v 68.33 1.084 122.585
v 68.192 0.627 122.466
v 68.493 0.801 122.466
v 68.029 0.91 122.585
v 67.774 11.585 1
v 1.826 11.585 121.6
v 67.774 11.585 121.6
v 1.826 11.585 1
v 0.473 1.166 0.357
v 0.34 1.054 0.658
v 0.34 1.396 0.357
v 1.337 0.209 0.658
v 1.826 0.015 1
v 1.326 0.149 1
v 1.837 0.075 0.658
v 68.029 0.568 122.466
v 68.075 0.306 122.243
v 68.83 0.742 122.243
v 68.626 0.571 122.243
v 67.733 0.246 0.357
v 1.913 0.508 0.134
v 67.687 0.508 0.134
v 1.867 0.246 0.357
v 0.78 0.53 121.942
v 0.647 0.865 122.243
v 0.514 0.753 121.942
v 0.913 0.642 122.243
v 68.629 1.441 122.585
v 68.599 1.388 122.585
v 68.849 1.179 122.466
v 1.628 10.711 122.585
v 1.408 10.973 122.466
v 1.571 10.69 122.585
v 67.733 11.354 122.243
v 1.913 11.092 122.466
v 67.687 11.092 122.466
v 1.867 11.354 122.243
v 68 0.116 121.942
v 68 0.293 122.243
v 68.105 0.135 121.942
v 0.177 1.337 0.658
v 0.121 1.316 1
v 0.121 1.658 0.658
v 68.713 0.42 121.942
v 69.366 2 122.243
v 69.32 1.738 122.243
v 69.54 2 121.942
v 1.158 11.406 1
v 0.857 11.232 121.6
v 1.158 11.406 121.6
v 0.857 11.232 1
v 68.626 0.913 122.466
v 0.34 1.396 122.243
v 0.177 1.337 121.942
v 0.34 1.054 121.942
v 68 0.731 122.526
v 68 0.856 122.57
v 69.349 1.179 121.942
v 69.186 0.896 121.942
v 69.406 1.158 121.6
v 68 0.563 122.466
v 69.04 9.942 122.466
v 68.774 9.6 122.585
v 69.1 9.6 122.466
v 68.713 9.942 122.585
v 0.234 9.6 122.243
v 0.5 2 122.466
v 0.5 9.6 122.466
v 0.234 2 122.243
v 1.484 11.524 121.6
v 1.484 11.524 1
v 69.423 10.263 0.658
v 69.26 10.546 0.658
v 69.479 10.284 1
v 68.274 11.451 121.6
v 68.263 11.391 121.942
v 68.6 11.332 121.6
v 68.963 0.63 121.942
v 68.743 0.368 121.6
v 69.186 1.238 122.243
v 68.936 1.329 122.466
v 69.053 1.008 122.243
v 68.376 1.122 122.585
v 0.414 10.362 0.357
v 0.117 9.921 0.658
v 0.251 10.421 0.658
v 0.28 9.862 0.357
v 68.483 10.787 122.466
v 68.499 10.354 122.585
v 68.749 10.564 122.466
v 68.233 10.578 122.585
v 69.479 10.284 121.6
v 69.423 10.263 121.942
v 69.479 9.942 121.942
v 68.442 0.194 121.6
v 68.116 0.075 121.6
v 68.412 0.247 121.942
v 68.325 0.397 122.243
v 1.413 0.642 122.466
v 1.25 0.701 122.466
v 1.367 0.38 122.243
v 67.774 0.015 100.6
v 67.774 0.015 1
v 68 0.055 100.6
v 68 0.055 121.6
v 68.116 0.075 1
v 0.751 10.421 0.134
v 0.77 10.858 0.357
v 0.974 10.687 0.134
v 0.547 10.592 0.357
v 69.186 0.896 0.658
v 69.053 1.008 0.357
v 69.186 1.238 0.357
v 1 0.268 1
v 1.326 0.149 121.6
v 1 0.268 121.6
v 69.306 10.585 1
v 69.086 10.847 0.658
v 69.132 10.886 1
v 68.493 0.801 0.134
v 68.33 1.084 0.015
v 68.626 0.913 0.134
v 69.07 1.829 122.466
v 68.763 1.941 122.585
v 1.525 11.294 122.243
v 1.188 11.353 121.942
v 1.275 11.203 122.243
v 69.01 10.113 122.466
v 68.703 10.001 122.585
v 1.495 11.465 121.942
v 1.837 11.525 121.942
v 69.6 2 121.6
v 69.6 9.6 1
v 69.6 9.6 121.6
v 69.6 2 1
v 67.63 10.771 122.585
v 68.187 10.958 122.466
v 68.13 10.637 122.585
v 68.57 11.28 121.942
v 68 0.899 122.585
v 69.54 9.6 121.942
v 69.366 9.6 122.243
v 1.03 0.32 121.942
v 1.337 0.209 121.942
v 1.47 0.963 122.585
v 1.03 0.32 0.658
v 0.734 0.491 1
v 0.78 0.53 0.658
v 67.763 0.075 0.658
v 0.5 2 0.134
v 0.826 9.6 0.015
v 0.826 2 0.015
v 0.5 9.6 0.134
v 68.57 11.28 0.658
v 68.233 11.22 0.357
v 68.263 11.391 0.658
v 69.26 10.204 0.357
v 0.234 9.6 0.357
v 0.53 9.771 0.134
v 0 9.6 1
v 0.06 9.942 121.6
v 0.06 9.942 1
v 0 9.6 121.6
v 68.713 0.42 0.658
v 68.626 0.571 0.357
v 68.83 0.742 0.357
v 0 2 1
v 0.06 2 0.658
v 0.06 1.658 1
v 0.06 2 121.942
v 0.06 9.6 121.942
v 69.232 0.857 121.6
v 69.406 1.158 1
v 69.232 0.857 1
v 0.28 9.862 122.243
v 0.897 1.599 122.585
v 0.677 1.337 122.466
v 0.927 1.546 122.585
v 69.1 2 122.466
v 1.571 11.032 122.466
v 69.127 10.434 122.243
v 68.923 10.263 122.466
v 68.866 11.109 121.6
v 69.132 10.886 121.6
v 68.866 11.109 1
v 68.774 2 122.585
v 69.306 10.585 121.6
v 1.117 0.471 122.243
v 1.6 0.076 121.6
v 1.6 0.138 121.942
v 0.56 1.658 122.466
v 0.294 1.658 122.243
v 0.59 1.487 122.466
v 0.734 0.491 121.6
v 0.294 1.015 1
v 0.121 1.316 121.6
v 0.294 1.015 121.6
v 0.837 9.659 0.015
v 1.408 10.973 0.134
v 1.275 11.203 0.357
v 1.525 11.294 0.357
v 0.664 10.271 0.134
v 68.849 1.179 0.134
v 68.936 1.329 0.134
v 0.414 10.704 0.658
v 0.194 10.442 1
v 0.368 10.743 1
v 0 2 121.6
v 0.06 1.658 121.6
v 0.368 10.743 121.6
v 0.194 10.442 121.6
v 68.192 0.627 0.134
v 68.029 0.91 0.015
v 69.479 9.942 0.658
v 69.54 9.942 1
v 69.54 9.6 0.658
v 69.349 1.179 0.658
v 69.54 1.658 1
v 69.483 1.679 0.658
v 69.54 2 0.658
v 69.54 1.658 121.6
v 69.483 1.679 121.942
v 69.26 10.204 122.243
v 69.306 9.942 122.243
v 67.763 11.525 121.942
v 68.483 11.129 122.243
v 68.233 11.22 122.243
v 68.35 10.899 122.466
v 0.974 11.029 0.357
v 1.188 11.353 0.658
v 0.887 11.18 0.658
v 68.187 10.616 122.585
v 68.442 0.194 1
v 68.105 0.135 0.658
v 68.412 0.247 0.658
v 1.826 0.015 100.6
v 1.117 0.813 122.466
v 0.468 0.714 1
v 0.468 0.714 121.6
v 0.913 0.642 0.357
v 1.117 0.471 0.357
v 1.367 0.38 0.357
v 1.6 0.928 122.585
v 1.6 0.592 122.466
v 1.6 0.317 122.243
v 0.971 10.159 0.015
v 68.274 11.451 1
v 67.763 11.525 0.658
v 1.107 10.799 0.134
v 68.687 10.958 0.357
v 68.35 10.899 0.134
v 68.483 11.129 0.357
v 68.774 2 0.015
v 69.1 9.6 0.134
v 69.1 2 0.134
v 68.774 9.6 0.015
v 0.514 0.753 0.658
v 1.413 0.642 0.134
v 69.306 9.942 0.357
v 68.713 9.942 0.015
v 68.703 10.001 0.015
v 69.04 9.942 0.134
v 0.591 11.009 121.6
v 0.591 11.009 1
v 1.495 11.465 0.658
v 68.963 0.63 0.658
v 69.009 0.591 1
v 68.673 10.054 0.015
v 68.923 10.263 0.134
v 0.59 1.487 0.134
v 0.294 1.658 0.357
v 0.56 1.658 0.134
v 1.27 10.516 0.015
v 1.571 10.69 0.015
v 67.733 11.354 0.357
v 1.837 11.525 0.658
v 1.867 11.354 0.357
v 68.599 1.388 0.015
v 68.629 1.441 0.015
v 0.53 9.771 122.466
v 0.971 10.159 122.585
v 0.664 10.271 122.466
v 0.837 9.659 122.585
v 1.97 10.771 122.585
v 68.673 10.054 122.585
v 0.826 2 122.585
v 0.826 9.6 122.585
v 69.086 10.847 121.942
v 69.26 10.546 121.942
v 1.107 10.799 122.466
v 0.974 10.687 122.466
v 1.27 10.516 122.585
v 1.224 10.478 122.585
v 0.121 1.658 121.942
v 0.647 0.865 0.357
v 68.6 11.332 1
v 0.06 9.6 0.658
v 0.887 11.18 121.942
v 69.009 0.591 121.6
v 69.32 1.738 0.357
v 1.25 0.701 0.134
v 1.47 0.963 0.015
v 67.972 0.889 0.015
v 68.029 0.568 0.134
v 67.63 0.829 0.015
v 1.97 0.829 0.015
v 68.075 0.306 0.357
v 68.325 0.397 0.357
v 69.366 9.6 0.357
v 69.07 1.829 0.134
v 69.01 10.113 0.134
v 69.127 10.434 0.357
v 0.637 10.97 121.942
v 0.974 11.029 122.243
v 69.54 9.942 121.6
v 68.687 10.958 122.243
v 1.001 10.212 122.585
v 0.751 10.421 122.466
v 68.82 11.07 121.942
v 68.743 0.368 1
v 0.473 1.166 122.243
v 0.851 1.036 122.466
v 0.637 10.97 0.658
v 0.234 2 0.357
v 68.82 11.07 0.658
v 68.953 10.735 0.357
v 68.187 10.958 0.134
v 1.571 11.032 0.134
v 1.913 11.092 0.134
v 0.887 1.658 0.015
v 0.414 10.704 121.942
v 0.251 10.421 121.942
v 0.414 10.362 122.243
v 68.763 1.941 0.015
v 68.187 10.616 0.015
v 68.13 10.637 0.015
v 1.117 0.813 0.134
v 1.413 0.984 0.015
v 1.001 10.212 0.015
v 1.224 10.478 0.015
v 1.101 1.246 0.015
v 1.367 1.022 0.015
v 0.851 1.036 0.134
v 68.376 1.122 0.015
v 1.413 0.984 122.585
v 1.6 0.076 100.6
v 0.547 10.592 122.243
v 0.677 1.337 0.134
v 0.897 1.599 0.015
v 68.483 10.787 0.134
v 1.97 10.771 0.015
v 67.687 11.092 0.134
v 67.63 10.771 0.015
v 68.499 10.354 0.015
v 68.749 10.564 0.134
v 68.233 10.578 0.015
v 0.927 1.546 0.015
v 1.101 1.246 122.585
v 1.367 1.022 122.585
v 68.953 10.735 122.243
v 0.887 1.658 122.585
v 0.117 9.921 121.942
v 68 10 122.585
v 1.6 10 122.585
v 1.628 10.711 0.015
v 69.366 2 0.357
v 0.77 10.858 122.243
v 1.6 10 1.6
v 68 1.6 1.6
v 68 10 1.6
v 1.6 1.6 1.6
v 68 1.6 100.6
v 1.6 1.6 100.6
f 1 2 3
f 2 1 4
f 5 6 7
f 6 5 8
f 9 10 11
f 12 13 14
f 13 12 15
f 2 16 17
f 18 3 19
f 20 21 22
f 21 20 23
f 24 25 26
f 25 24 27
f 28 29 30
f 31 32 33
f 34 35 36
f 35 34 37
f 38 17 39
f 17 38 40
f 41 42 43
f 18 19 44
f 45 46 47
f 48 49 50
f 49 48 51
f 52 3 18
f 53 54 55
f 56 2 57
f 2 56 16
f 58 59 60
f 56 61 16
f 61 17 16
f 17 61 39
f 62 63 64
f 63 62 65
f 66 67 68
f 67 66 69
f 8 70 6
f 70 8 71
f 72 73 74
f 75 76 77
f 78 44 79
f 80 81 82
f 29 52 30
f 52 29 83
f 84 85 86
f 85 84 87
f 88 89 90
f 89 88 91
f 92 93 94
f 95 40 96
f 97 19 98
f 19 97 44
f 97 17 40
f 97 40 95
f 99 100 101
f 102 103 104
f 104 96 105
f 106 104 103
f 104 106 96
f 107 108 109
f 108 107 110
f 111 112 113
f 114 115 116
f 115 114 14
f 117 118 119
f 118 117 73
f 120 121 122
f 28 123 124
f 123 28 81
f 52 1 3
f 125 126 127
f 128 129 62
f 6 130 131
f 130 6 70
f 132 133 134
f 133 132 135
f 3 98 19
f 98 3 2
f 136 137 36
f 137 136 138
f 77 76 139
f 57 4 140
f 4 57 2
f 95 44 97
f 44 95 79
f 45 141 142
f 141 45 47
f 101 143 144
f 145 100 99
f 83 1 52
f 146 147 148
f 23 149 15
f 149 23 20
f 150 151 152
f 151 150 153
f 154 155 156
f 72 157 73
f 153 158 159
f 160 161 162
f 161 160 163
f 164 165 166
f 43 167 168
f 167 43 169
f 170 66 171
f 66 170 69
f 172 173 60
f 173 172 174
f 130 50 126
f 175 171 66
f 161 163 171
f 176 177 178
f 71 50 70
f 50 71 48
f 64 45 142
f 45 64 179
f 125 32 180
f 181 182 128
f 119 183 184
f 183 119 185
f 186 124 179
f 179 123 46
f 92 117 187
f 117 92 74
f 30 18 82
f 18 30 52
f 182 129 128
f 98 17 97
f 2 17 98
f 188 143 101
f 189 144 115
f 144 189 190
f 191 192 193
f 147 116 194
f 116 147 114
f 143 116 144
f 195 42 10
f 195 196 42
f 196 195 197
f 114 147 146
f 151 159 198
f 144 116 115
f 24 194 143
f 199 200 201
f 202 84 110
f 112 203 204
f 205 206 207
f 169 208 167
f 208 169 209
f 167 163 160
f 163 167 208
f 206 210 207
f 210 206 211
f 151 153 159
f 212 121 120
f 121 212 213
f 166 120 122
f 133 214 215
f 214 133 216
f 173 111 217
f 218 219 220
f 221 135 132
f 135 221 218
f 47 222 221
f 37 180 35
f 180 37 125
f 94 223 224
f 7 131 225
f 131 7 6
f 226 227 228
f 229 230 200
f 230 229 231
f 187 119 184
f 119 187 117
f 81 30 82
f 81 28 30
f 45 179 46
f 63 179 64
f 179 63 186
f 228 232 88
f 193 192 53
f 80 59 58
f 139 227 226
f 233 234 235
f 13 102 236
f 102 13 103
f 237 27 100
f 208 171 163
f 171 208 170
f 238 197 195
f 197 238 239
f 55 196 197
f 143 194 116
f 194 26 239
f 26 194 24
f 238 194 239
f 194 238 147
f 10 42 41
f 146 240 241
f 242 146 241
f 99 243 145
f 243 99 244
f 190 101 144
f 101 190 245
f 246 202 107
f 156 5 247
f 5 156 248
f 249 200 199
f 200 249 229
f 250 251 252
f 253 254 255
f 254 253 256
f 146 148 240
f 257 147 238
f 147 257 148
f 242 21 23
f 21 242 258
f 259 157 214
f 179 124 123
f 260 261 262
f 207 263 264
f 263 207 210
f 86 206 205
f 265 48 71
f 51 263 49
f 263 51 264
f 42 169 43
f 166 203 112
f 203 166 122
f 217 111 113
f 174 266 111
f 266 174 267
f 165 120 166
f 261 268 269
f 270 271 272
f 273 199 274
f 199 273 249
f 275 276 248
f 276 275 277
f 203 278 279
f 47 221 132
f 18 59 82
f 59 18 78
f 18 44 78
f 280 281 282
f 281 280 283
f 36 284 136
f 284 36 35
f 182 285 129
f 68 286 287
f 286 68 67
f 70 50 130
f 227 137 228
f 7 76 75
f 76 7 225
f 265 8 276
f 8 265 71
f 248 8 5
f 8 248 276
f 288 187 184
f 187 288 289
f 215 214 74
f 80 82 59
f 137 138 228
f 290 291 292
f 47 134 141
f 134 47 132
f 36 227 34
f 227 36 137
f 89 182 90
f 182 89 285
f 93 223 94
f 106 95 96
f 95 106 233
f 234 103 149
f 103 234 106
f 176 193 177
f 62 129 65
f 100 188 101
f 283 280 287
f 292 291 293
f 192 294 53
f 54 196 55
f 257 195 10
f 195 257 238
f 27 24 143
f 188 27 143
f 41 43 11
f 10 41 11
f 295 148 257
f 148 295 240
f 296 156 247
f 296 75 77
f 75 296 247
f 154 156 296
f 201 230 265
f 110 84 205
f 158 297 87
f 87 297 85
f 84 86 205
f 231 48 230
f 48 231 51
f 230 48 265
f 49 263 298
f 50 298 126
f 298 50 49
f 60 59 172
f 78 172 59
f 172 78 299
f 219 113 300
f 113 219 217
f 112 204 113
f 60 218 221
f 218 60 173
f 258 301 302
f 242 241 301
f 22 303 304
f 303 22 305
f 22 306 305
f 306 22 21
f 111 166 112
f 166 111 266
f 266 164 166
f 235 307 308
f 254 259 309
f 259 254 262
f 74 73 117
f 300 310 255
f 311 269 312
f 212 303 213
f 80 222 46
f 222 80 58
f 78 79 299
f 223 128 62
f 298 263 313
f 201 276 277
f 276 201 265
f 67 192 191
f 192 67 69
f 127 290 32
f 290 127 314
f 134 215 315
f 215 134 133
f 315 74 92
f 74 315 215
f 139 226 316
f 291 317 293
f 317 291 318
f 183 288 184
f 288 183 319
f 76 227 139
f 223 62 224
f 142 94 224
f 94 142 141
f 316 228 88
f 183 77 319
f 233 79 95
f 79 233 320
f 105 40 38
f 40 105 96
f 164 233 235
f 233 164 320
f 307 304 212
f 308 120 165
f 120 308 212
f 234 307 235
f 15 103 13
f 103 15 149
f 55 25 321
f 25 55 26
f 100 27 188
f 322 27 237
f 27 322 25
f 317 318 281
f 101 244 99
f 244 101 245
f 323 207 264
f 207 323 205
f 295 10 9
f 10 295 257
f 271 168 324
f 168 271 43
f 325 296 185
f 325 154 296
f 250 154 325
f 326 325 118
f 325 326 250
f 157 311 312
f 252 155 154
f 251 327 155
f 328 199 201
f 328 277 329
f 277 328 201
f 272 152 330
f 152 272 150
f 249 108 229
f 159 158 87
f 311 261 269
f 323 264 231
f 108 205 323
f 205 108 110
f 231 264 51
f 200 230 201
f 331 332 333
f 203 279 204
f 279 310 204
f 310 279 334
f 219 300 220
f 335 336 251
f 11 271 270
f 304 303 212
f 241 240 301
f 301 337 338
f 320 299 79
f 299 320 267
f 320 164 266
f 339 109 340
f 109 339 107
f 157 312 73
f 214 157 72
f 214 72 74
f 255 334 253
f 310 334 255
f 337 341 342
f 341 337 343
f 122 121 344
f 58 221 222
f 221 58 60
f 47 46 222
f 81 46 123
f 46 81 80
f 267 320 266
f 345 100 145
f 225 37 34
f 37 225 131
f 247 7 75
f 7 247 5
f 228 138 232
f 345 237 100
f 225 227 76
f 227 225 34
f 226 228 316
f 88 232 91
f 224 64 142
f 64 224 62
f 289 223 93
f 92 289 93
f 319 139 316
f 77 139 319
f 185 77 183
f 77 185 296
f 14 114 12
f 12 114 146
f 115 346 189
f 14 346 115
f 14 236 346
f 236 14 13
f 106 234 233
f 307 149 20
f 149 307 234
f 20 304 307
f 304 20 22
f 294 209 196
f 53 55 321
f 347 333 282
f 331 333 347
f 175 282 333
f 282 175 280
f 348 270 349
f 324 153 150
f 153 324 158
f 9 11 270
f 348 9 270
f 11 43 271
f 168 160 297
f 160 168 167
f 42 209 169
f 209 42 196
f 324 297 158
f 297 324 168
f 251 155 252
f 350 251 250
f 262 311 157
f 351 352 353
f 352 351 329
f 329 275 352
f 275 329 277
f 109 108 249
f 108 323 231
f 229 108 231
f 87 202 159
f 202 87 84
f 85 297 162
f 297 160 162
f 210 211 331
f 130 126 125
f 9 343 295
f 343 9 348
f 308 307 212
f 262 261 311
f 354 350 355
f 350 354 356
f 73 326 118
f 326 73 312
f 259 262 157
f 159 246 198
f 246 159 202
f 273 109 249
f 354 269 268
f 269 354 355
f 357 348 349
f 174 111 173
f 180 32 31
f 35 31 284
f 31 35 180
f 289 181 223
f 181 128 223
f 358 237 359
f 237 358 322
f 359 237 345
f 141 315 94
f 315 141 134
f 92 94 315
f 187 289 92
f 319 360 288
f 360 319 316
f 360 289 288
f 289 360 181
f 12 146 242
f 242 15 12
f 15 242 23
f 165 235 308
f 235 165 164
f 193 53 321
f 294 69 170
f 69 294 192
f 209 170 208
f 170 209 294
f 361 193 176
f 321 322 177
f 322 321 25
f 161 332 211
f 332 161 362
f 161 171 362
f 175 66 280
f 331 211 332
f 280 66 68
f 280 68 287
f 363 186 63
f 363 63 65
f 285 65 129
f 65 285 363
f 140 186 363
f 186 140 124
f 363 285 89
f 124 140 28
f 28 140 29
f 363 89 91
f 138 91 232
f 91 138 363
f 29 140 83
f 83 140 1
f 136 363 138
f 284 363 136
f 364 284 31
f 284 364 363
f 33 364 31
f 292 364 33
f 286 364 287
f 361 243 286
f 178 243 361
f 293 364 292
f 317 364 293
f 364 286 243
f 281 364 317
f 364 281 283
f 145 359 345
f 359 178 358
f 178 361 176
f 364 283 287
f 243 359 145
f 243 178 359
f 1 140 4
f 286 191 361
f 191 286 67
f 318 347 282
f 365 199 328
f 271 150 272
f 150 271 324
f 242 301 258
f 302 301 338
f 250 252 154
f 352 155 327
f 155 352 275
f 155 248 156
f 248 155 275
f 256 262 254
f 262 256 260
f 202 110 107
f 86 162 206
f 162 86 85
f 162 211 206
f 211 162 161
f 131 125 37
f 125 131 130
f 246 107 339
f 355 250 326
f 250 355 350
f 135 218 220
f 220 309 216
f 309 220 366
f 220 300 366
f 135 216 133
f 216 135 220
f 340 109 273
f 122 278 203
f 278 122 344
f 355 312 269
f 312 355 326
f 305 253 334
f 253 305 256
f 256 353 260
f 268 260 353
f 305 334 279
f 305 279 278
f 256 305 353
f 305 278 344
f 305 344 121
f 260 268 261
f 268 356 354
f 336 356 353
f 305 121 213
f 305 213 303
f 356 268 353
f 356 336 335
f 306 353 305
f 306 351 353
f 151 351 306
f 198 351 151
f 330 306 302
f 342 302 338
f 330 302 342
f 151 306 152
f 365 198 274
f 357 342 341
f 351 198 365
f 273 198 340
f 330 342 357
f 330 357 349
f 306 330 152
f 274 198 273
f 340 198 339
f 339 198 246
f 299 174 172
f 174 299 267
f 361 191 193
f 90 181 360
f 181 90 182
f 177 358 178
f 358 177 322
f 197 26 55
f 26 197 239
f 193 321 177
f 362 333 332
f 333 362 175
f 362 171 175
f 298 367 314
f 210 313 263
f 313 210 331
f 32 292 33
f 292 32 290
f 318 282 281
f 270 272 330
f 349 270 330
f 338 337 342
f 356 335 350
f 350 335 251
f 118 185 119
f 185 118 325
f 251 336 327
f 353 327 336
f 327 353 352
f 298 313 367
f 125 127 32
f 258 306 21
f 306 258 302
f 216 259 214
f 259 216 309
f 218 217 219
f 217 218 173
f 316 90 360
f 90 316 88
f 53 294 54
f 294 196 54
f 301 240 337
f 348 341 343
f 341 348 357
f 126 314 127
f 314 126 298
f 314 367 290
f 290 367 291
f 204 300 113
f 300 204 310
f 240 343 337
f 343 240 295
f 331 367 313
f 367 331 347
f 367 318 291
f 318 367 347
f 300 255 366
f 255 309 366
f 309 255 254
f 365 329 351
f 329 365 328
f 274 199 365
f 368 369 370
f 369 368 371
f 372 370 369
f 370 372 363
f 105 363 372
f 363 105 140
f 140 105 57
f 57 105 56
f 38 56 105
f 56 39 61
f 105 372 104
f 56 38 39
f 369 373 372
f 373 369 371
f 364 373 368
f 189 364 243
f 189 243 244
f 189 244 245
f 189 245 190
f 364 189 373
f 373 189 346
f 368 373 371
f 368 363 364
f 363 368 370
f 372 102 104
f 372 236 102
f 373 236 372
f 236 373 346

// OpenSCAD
// =============================================
// 3D: phone iphone14 mini table holder — base
// Version: 2.0
// Author: generator
// =============================================

// Short description for models table
description = "phone iphone14 mini table holder — base";
version_str = "2.0";

// Модель стоит вертикально, по xy вырезом вниз, его видно с фронтальной проекции
// Карман шириной с телефон с зазором, y - толщина телефона с зазором, z - высота телефона
// Спереди вырез под камеру, z - высота выреза. Телефон стоит камерами вверх, экраном назад.
// Телефон (с учётом чехла/кнопок)


// ----------------------------
// Параметры модели (все размеры в мм)
// ----------------------------
is_small = false;
phone_w = is_small ? 66 : 66; // ширина телефона по X, с боковыми кнопками
phone_h_gap = 10;
phone_h = is_small ? 20 : 131 - phone_h_gap; // высота телефона (идёт в глубину кармана) по Y
phone_th = is_small ? 8 : 8; // толщина телефона по Z
notch_camera_z = is_small ? phone_h - 10 : 32 - phone_h_gap;

// Зазоры кармана (внутренние)
pocket_clear_x = 0.4; // общий запас по X (ширина) — суммарно (0 для точного соответствия)
pocket_clear_y = 0.4; // запас по Y (толщина)
pocket_clear_z = 0; // запас по Z (высота)

// Стенки/толщины
wall_xy  = is_small ? 2 : 1.6;  // толщина боковой стенки (X/Y)
wall_z   = is_small ? 2 : 1.6;  // толщина снизу/сверху (Z)

// Скругления
radius_r = 2;
mink_r   = 1;

print_notch = true; // output notch difference




use <../modules.scad>

// ----------------------------
// Настройка точности
// ----------------------------
$fn = 0;        // фиксированную сегментацию отключаем
$fa = 6;        // 5–8° обычно достаточно
$fs = 0.35;     // ≈ диаметр сопла (0.3–0.5 для сопла 0.4)
pin_fs = 0.25;  // чуть тоньше для штырей и отверстий

// ----------------------------
// Вычисляемые переменные
// ----------------------------
inner_x = phone_w + pocket_clear_x;
inner_y = phone_th + pocket_clear_y;
inner_z = phone_h + pocket_clear_z;
outer_x = inner_x + 2 * wall_xy;
outer_y = inner_y + 2 * wall_xy;
outer_z = inner_z + wall_z;

// ----------------------------
// Модули фрагментов модели
// ----------------------------
module base(){
    rounded_prism_with_pocket(
        size=[outer_x, outer_y],
        h=outer_z,
        r=radius_r,
        kr=mink_r,
        wall_th=wall_xy,
        h_th=wall_z,
        pocket_r=0 // sharp-cornered pocket, as printed (pre-v1.3 modules.scad default)
    );
}

module notch(){
    translate([wall_xy, -eps(), outer_z - notch_camera_z])
        rounded_prism(
            size=[inner_x, wall_xy + 2*eps()],
            h=notch_camera_z + eps()
        );
}

// Вывод всех деталей
module all_details(){
    // mink(mink_r, [outer_x, outer_y, outer_z], kernel="sphere"){ 
        if(print_notch) { difference(){ base(); notch(); } }
        else base();
    // }
}

// ----------------------------
// ВЫВОД МОДЕЛИ
// ----------------------------
module render(){
    clip_for_fragments(){ all_details(); }
}

render();
